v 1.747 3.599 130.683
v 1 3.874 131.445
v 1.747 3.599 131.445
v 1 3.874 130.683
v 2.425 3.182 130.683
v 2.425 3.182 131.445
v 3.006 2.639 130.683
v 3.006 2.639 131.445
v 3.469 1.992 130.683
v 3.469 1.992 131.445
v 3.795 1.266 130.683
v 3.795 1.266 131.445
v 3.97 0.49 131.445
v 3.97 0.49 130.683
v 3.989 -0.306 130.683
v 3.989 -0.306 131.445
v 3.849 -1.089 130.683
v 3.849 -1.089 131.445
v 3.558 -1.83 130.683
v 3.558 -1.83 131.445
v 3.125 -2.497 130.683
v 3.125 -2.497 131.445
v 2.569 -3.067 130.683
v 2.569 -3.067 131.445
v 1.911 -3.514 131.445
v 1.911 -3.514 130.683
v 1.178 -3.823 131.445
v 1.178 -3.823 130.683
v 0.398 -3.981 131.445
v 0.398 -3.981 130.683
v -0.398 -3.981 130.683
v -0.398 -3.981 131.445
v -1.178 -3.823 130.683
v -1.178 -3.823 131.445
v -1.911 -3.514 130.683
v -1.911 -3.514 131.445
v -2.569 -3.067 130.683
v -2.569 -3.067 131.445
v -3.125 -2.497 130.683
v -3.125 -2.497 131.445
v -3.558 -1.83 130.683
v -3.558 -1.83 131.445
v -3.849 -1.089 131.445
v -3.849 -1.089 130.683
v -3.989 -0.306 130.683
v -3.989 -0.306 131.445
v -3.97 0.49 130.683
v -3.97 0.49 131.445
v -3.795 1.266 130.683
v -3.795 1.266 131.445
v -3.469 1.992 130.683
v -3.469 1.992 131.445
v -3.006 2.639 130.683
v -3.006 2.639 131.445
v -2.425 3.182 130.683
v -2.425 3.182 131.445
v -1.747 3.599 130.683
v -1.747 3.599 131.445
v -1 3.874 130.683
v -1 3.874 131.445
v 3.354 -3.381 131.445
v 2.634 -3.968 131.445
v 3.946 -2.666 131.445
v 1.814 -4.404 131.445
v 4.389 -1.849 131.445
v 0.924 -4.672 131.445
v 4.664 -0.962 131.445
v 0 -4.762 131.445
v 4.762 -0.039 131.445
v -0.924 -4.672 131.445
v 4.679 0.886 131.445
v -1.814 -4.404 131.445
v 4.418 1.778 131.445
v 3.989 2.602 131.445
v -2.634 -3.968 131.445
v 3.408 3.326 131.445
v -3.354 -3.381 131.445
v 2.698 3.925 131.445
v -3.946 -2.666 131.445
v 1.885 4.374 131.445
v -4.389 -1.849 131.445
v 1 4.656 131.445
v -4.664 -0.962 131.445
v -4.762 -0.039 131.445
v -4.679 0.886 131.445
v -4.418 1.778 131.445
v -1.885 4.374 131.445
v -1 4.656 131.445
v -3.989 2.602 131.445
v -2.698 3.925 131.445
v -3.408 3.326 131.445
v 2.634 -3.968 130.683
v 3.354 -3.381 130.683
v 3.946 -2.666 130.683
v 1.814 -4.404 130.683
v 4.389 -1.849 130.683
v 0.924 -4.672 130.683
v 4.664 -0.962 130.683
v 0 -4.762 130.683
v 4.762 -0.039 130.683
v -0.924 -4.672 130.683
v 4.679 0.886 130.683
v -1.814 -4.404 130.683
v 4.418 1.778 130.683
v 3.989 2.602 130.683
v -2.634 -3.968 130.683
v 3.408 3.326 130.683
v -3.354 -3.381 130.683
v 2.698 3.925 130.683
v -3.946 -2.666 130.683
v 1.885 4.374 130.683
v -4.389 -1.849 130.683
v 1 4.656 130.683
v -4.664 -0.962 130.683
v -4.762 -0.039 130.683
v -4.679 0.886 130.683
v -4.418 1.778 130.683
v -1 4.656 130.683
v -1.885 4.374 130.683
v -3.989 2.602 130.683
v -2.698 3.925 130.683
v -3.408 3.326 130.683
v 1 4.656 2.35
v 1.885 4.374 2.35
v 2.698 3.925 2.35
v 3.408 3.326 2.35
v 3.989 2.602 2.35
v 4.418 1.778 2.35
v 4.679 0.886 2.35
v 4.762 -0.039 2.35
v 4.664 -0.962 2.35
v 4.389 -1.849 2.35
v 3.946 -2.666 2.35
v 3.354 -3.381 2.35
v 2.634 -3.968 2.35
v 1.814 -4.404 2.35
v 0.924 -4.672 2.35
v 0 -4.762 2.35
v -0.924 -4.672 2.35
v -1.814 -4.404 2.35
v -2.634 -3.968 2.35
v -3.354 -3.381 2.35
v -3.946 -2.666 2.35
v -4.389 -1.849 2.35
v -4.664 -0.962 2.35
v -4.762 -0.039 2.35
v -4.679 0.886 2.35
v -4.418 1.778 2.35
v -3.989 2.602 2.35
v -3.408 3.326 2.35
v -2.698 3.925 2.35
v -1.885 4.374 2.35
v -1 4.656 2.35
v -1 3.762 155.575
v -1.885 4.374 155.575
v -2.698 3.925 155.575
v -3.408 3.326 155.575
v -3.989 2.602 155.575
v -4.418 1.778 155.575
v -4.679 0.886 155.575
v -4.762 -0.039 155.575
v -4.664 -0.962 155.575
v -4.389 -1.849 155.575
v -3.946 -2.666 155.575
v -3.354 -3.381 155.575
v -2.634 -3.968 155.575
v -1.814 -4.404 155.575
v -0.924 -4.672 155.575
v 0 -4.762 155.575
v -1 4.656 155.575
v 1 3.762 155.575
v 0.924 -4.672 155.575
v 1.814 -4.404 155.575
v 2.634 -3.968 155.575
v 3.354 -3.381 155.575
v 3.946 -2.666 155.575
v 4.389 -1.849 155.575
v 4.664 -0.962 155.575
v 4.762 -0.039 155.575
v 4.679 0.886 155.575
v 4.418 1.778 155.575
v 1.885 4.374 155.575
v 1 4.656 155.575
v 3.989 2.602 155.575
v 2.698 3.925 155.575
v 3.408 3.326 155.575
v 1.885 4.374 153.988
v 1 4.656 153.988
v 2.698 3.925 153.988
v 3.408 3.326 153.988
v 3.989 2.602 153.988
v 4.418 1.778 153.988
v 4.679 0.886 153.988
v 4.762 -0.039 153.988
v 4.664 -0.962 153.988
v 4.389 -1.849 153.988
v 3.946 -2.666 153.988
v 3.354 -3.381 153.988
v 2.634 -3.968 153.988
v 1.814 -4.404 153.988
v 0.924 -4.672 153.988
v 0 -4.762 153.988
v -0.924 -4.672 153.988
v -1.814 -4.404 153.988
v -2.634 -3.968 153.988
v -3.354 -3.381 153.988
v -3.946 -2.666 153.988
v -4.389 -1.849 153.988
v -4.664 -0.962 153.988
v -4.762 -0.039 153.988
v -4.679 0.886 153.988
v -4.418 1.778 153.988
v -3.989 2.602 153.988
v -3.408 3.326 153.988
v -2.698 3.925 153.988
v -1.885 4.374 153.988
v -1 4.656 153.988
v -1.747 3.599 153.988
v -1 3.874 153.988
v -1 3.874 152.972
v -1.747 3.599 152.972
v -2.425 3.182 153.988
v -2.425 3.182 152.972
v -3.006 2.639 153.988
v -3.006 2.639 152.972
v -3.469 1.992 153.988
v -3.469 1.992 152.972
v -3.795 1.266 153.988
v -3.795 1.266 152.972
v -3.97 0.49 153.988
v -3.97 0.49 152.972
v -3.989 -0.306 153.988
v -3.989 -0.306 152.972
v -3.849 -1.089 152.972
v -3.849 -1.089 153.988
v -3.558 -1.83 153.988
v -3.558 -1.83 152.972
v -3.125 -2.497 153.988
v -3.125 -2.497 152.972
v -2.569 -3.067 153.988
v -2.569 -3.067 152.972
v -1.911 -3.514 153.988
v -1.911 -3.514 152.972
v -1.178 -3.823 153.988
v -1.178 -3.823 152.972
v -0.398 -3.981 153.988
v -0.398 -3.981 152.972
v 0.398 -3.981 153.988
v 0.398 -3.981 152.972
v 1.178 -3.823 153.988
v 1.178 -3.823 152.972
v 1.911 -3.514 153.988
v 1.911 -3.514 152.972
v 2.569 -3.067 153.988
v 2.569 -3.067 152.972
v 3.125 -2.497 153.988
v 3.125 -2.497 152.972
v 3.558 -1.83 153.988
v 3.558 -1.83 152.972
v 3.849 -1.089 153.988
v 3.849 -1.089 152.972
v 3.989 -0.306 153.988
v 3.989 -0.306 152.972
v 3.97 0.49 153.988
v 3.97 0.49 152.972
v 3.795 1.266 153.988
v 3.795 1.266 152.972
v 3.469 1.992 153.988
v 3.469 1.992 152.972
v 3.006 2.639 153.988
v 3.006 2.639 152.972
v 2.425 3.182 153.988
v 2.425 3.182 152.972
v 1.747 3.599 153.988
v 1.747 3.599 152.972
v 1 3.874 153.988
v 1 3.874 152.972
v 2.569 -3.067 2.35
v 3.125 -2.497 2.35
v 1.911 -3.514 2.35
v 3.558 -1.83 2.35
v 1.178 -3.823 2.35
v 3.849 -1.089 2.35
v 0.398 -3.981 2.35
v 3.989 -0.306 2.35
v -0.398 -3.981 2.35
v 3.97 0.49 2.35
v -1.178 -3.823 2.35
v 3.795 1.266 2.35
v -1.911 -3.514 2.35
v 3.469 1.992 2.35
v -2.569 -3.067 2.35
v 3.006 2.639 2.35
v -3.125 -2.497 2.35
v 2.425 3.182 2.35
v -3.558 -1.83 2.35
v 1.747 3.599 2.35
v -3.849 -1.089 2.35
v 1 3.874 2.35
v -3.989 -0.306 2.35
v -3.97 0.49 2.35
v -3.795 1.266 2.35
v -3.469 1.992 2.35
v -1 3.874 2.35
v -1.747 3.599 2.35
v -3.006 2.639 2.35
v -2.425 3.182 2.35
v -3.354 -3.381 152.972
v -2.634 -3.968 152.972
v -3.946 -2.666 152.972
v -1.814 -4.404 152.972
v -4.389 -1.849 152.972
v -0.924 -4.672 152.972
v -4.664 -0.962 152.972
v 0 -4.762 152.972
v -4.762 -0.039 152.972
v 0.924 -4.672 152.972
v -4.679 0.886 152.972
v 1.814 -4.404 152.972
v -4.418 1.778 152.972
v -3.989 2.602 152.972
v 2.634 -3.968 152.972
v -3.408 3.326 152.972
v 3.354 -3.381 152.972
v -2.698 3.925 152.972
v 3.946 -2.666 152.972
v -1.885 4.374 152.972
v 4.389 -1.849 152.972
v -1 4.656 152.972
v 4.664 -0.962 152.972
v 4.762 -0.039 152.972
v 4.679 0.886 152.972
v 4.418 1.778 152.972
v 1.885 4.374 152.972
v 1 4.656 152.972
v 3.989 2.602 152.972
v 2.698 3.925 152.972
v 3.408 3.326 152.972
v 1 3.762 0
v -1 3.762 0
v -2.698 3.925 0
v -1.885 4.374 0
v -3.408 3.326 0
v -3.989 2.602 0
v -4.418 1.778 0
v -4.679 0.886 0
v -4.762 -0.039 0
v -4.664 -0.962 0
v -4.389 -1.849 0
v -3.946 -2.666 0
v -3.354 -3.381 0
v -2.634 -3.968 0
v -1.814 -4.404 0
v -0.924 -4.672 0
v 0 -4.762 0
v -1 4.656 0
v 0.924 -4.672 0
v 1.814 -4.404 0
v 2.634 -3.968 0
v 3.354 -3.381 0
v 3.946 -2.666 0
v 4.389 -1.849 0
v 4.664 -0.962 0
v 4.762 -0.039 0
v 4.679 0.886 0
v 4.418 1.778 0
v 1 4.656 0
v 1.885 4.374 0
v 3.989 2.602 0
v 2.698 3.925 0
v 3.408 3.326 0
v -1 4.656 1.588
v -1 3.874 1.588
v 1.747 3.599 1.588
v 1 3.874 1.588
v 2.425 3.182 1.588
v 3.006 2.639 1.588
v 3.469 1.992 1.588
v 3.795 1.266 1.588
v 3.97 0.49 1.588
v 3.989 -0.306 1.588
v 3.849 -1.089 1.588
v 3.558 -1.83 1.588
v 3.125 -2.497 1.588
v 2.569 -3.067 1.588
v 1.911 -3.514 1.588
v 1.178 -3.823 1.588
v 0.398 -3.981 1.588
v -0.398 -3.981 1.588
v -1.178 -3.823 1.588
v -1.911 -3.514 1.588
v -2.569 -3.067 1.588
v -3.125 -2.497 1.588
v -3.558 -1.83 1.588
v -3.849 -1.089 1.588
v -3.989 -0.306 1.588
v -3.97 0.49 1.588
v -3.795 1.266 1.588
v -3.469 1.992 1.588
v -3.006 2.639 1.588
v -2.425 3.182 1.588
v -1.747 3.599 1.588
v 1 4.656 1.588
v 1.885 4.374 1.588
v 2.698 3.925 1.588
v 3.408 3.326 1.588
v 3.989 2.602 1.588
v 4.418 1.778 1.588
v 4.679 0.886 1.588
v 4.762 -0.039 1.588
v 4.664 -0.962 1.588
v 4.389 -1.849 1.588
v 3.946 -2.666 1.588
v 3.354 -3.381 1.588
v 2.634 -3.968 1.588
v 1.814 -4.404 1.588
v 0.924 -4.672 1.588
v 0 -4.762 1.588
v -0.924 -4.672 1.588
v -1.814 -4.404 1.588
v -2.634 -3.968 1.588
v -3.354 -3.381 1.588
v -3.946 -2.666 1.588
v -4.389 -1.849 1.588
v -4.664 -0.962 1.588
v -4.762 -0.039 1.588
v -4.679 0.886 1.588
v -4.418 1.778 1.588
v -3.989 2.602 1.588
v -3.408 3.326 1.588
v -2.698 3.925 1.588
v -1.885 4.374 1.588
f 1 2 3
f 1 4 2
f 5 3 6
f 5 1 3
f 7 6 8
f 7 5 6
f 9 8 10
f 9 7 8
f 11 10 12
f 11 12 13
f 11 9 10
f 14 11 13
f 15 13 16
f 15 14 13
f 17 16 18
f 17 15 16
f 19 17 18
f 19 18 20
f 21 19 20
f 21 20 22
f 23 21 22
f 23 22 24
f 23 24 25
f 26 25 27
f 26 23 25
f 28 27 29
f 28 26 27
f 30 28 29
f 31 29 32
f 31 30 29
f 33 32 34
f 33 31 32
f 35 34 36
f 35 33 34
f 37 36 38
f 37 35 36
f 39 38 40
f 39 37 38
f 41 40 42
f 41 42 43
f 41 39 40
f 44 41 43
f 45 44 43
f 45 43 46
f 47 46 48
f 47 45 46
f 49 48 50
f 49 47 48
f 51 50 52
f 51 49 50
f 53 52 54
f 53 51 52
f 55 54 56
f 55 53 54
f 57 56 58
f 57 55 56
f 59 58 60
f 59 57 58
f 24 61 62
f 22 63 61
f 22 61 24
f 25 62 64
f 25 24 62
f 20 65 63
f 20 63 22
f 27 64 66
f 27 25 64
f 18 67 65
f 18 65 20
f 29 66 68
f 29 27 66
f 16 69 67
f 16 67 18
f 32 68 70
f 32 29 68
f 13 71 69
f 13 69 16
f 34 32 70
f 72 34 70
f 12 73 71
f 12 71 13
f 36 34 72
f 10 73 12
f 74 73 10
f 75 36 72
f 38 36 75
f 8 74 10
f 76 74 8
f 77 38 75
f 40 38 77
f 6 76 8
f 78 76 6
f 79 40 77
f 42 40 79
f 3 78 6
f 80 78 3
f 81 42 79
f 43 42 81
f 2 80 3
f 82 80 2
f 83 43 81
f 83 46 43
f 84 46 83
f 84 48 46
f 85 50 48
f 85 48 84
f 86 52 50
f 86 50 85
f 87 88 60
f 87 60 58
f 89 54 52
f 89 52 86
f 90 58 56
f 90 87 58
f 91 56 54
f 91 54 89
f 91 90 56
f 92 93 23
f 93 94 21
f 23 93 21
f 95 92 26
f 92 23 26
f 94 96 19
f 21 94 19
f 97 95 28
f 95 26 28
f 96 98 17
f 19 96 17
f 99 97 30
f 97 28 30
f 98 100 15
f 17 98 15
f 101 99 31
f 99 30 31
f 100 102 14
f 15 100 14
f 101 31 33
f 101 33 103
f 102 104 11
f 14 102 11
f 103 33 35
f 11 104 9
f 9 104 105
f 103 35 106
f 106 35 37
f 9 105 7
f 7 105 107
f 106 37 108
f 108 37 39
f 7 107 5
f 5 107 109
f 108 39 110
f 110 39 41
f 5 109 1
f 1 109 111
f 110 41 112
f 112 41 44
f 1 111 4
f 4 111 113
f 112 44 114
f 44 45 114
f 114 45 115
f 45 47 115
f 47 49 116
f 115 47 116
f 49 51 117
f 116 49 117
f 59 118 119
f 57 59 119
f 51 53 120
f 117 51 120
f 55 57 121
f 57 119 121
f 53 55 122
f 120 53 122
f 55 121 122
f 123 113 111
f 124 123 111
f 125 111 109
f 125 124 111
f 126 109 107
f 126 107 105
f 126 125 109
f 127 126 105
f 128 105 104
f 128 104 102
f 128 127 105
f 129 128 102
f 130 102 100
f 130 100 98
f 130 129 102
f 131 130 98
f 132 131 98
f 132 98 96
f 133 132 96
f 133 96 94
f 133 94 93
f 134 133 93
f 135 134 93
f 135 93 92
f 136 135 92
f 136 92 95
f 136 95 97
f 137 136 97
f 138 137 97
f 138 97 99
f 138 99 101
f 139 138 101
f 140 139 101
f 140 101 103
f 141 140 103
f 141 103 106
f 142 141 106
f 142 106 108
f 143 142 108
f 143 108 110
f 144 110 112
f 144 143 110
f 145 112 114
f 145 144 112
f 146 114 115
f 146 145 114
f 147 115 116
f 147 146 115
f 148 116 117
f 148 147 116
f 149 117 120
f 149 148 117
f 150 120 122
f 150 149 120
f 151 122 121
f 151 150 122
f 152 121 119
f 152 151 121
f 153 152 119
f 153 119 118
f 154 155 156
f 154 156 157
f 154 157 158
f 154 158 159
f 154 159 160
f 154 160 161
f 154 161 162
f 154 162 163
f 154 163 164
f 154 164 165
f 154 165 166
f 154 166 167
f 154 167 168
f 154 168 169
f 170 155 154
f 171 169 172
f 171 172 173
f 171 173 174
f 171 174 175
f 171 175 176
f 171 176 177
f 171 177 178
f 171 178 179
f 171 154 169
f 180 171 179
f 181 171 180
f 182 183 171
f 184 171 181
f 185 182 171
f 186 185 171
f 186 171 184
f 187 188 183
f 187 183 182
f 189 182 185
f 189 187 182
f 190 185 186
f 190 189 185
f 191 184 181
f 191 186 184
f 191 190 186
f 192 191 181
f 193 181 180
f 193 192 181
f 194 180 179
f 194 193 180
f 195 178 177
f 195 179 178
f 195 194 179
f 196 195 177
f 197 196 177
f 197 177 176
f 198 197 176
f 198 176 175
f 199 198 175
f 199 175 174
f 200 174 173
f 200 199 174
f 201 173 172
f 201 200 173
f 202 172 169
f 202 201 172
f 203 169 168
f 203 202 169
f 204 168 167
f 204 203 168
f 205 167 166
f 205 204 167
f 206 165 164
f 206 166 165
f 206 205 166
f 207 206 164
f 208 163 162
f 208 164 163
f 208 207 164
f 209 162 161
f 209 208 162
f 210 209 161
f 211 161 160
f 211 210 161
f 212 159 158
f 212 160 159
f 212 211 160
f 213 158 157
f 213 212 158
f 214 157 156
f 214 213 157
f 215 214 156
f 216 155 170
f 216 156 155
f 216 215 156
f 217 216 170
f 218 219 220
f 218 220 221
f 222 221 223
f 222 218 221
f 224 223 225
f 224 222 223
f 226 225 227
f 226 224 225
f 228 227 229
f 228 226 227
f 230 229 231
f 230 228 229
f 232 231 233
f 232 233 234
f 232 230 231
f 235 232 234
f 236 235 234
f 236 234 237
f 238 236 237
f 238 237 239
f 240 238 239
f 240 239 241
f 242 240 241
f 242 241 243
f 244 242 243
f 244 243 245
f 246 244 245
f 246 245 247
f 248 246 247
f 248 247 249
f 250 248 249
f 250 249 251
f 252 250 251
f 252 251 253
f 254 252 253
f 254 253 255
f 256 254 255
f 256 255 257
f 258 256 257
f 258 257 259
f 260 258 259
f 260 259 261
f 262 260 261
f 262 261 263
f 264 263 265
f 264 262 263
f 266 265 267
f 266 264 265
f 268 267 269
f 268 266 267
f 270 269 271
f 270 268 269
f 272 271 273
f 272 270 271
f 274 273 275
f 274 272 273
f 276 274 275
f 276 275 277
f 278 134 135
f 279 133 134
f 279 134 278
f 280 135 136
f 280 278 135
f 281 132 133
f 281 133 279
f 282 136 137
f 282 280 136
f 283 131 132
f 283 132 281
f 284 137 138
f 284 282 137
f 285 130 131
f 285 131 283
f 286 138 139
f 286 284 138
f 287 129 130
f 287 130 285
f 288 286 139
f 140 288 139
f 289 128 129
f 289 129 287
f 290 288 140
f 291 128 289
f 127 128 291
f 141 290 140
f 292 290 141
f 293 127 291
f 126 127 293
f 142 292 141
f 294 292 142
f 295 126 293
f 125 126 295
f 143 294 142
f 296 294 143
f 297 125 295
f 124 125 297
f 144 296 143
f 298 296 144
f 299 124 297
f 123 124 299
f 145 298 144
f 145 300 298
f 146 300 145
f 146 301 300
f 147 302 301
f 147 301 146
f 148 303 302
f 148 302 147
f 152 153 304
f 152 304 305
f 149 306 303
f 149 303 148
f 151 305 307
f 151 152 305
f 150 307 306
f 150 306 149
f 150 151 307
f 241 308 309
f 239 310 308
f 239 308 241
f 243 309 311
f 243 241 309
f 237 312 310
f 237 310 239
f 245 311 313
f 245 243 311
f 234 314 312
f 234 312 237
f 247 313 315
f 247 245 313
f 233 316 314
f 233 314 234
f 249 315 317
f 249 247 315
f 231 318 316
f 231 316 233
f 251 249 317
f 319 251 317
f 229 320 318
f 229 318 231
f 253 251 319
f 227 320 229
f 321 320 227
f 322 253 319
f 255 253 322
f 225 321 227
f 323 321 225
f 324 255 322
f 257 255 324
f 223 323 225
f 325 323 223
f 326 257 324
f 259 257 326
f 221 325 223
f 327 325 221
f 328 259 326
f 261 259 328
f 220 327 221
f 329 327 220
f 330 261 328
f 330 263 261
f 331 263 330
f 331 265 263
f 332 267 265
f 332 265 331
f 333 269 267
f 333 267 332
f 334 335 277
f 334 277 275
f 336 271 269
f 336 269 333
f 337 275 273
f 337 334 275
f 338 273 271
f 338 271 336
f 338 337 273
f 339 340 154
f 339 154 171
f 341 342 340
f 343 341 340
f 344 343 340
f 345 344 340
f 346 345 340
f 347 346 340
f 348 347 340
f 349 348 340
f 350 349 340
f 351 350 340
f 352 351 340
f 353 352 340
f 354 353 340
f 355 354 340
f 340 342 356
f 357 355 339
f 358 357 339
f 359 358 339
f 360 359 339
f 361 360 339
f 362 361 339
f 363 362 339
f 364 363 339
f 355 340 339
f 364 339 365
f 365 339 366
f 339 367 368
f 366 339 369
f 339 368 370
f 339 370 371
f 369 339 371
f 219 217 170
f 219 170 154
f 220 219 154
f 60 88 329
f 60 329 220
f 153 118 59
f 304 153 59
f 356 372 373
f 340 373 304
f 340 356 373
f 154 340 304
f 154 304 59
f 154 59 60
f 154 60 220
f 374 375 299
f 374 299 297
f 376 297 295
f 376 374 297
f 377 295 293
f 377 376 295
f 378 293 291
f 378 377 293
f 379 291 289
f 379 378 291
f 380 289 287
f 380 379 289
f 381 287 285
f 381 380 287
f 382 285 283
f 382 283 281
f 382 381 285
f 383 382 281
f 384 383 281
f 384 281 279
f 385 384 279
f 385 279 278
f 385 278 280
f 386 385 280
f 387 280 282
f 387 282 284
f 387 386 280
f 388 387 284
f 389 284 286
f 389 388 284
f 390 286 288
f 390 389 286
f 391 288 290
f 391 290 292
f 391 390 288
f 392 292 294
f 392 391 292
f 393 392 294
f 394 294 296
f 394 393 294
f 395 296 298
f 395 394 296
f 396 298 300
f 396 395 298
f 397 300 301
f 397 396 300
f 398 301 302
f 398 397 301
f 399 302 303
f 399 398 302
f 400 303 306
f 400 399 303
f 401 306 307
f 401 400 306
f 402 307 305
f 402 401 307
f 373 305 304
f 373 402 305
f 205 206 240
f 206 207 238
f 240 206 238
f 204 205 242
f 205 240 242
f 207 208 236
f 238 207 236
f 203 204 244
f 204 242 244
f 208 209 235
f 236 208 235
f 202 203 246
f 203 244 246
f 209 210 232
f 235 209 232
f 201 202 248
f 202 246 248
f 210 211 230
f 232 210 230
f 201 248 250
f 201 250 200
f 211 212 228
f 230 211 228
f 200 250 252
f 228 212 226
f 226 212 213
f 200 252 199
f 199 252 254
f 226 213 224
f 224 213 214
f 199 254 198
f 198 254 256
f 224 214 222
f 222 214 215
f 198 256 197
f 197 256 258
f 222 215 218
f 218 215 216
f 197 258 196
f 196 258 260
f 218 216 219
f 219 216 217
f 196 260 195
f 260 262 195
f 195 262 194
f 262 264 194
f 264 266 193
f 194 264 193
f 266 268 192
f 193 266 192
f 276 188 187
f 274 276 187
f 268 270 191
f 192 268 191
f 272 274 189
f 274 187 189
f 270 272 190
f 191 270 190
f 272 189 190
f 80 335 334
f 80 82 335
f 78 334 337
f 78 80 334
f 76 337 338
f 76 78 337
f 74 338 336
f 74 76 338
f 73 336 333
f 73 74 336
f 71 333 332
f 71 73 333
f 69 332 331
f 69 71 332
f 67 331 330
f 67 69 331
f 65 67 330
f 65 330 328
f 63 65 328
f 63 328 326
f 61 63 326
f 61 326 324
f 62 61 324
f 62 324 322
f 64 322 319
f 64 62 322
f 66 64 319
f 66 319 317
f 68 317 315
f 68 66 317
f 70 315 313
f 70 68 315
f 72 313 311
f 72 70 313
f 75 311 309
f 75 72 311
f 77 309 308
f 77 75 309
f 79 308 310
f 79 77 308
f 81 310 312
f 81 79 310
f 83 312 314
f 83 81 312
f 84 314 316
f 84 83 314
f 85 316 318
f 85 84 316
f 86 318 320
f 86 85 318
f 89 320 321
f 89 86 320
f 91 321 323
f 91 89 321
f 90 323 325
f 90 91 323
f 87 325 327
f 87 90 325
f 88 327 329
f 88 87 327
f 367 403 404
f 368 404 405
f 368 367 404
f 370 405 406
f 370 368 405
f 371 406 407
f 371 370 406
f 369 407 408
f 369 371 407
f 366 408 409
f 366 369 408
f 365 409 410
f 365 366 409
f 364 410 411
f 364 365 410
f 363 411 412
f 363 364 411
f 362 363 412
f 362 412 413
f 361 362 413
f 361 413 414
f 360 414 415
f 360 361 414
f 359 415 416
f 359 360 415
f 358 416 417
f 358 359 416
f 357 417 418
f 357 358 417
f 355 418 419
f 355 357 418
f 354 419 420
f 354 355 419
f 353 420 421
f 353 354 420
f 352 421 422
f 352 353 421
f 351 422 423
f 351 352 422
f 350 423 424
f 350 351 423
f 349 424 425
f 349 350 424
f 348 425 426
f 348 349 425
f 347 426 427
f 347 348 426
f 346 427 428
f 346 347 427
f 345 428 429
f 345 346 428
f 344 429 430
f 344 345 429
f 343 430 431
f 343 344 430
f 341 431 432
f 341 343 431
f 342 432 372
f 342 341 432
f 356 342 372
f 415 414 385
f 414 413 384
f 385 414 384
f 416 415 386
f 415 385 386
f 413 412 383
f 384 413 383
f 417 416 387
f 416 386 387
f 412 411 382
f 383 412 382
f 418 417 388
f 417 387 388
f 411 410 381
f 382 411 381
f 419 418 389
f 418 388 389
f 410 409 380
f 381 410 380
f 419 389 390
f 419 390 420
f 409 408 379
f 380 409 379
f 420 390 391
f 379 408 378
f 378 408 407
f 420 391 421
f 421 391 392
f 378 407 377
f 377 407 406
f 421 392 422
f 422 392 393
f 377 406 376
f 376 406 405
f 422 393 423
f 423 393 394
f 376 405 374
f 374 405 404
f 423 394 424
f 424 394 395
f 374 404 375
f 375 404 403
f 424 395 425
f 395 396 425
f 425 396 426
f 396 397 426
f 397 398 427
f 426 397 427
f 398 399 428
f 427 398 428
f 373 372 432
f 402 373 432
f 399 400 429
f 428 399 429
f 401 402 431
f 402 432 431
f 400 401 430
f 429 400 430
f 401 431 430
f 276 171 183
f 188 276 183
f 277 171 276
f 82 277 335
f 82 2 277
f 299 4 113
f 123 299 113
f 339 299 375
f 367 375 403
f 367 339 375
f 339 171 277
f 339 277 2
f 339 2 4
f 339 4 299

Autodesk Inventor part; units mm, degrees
sketch "Sketch1" plane through (0, 0, 0) normal (0, 0, 1) x (1, 0, 0)
  arc A0 (-1, 4.6563) -> (1, 4.6563) centre (0, 0) ccw
  line L0 (-1, 3.7625) -> (1, 3.7625)
  line L1 (1, 3.7625) -> (1, 4.6563)
  line L2 (1, 5.7625) -> (-1, 5.7625) construction
  line L3 (-1, 5.7625) -> (-1, 4.6563) construction
  arc A1 (1, 4.6563) -> (-1, 4.6563) centre (0, 0) ccw construction
  line L4 (-1, 4.6563) -> (-1, 3.7625)
  line L5 (1, 4.6563) -> (1, 5.7625) construction
  dimension "d0" = 9.525
  dimension "d3" = 2
  dimension "d4" = 2
  dimension "d5" = 1
  dimension "d6" = 3.7625
extrude "Extrusion1" add sketch "Sketch1" along normal blind 155.575
ref_plane "Work Plane1" through (0, 0, 1.5875) normal (0, 0, -1) x (-1, 0, 0)
sketch "Sketch2" plane through (0, 0, 1.5875) normal (0, 0, -1) x (-1, 0, 0)
  line L0 (-1, 3.7625) -> (-1, 4.6563) projected
  line L1 (1, 3.7625) -> (-1, 3.7625) projected
  line L2 (1, 4.6563) -> (1, 3.7625) projected
  arc A0 (-1, 4.6563) -> (1, 4.6563) centre (0, 0) ccw projected
  arc A1 (-1, 3.8735) -> (1, 3.8735) centre (0, 0) ccw
  arc A2 (1, 3.8735) -> (-1, 3.8735) centre (0, 0) ccw construction
  dimension "d9" = 0.762
extrude "Extrusion2" cut sketch "Sketch2" against normal blind 0.762 contours A1 L2 A0 L0
ref_plane "Work Plane2" through (0, 0, 130.683) normal (0, 0, -1) x (-1, 0, 0)
sketch "Sketch3" plane through (0, 0, 130.683) normal (0, 0, -1) x (-1, 0, 0)
  arc A0 (-1, 3.8735) -> (1, 3.8735) centre (0, 0) ccw projected
  line L0 (-1, 3.7625) -> (-1, 4.6563) projected
  arc A1 (-1, 4.6563) -> (1, 4.6563) centre (0, 0) ccw projected
  line L1 (1, 4.6563) -> (1, 3.7625) projected
  line L2 (1, 3.7625) -> (-1, 3.7625) projected
extrude "Extrusion3" cut sketch "Sketch3" against normal blind 0.762 contours A0 L1 A1 L0
ref_plane "Work Plane3" through (0, 0, 153.9875) normal (0, 0, 1) x (1, 0, 0)
sketch "Sketch4" plane through (0, 0, 153.9875) normal (0, 0, 1) x (1, 0, 0)
  arc A0 (-1, 3.8735) -> (1, 3.8735) centre (0, 0) ccw projected
  line L0 (-1, 3.7625) -> (1, 3.7625) projected
  line L1 (-1, 4.6563) -> (-1, 3.7625) projected
  line L2 (1, 3.7625) -> (1, 4.6563) projected
  arc A1 (-1, 4.6563) -> (1, 4.6563) centre (0, 0) ccw projected
extrude "Extrusion4" cut sketch "Sketch4" against normal blind 1.016 contours A0 L2 A1 L1
equation "\"d4\" = d3"
equation "\"d5\" = 0.5 * d3"
equation "\"d6\" = 0.5 * d0 - 0.5 * d4"
properties part number "vertical drive shaft 3"
